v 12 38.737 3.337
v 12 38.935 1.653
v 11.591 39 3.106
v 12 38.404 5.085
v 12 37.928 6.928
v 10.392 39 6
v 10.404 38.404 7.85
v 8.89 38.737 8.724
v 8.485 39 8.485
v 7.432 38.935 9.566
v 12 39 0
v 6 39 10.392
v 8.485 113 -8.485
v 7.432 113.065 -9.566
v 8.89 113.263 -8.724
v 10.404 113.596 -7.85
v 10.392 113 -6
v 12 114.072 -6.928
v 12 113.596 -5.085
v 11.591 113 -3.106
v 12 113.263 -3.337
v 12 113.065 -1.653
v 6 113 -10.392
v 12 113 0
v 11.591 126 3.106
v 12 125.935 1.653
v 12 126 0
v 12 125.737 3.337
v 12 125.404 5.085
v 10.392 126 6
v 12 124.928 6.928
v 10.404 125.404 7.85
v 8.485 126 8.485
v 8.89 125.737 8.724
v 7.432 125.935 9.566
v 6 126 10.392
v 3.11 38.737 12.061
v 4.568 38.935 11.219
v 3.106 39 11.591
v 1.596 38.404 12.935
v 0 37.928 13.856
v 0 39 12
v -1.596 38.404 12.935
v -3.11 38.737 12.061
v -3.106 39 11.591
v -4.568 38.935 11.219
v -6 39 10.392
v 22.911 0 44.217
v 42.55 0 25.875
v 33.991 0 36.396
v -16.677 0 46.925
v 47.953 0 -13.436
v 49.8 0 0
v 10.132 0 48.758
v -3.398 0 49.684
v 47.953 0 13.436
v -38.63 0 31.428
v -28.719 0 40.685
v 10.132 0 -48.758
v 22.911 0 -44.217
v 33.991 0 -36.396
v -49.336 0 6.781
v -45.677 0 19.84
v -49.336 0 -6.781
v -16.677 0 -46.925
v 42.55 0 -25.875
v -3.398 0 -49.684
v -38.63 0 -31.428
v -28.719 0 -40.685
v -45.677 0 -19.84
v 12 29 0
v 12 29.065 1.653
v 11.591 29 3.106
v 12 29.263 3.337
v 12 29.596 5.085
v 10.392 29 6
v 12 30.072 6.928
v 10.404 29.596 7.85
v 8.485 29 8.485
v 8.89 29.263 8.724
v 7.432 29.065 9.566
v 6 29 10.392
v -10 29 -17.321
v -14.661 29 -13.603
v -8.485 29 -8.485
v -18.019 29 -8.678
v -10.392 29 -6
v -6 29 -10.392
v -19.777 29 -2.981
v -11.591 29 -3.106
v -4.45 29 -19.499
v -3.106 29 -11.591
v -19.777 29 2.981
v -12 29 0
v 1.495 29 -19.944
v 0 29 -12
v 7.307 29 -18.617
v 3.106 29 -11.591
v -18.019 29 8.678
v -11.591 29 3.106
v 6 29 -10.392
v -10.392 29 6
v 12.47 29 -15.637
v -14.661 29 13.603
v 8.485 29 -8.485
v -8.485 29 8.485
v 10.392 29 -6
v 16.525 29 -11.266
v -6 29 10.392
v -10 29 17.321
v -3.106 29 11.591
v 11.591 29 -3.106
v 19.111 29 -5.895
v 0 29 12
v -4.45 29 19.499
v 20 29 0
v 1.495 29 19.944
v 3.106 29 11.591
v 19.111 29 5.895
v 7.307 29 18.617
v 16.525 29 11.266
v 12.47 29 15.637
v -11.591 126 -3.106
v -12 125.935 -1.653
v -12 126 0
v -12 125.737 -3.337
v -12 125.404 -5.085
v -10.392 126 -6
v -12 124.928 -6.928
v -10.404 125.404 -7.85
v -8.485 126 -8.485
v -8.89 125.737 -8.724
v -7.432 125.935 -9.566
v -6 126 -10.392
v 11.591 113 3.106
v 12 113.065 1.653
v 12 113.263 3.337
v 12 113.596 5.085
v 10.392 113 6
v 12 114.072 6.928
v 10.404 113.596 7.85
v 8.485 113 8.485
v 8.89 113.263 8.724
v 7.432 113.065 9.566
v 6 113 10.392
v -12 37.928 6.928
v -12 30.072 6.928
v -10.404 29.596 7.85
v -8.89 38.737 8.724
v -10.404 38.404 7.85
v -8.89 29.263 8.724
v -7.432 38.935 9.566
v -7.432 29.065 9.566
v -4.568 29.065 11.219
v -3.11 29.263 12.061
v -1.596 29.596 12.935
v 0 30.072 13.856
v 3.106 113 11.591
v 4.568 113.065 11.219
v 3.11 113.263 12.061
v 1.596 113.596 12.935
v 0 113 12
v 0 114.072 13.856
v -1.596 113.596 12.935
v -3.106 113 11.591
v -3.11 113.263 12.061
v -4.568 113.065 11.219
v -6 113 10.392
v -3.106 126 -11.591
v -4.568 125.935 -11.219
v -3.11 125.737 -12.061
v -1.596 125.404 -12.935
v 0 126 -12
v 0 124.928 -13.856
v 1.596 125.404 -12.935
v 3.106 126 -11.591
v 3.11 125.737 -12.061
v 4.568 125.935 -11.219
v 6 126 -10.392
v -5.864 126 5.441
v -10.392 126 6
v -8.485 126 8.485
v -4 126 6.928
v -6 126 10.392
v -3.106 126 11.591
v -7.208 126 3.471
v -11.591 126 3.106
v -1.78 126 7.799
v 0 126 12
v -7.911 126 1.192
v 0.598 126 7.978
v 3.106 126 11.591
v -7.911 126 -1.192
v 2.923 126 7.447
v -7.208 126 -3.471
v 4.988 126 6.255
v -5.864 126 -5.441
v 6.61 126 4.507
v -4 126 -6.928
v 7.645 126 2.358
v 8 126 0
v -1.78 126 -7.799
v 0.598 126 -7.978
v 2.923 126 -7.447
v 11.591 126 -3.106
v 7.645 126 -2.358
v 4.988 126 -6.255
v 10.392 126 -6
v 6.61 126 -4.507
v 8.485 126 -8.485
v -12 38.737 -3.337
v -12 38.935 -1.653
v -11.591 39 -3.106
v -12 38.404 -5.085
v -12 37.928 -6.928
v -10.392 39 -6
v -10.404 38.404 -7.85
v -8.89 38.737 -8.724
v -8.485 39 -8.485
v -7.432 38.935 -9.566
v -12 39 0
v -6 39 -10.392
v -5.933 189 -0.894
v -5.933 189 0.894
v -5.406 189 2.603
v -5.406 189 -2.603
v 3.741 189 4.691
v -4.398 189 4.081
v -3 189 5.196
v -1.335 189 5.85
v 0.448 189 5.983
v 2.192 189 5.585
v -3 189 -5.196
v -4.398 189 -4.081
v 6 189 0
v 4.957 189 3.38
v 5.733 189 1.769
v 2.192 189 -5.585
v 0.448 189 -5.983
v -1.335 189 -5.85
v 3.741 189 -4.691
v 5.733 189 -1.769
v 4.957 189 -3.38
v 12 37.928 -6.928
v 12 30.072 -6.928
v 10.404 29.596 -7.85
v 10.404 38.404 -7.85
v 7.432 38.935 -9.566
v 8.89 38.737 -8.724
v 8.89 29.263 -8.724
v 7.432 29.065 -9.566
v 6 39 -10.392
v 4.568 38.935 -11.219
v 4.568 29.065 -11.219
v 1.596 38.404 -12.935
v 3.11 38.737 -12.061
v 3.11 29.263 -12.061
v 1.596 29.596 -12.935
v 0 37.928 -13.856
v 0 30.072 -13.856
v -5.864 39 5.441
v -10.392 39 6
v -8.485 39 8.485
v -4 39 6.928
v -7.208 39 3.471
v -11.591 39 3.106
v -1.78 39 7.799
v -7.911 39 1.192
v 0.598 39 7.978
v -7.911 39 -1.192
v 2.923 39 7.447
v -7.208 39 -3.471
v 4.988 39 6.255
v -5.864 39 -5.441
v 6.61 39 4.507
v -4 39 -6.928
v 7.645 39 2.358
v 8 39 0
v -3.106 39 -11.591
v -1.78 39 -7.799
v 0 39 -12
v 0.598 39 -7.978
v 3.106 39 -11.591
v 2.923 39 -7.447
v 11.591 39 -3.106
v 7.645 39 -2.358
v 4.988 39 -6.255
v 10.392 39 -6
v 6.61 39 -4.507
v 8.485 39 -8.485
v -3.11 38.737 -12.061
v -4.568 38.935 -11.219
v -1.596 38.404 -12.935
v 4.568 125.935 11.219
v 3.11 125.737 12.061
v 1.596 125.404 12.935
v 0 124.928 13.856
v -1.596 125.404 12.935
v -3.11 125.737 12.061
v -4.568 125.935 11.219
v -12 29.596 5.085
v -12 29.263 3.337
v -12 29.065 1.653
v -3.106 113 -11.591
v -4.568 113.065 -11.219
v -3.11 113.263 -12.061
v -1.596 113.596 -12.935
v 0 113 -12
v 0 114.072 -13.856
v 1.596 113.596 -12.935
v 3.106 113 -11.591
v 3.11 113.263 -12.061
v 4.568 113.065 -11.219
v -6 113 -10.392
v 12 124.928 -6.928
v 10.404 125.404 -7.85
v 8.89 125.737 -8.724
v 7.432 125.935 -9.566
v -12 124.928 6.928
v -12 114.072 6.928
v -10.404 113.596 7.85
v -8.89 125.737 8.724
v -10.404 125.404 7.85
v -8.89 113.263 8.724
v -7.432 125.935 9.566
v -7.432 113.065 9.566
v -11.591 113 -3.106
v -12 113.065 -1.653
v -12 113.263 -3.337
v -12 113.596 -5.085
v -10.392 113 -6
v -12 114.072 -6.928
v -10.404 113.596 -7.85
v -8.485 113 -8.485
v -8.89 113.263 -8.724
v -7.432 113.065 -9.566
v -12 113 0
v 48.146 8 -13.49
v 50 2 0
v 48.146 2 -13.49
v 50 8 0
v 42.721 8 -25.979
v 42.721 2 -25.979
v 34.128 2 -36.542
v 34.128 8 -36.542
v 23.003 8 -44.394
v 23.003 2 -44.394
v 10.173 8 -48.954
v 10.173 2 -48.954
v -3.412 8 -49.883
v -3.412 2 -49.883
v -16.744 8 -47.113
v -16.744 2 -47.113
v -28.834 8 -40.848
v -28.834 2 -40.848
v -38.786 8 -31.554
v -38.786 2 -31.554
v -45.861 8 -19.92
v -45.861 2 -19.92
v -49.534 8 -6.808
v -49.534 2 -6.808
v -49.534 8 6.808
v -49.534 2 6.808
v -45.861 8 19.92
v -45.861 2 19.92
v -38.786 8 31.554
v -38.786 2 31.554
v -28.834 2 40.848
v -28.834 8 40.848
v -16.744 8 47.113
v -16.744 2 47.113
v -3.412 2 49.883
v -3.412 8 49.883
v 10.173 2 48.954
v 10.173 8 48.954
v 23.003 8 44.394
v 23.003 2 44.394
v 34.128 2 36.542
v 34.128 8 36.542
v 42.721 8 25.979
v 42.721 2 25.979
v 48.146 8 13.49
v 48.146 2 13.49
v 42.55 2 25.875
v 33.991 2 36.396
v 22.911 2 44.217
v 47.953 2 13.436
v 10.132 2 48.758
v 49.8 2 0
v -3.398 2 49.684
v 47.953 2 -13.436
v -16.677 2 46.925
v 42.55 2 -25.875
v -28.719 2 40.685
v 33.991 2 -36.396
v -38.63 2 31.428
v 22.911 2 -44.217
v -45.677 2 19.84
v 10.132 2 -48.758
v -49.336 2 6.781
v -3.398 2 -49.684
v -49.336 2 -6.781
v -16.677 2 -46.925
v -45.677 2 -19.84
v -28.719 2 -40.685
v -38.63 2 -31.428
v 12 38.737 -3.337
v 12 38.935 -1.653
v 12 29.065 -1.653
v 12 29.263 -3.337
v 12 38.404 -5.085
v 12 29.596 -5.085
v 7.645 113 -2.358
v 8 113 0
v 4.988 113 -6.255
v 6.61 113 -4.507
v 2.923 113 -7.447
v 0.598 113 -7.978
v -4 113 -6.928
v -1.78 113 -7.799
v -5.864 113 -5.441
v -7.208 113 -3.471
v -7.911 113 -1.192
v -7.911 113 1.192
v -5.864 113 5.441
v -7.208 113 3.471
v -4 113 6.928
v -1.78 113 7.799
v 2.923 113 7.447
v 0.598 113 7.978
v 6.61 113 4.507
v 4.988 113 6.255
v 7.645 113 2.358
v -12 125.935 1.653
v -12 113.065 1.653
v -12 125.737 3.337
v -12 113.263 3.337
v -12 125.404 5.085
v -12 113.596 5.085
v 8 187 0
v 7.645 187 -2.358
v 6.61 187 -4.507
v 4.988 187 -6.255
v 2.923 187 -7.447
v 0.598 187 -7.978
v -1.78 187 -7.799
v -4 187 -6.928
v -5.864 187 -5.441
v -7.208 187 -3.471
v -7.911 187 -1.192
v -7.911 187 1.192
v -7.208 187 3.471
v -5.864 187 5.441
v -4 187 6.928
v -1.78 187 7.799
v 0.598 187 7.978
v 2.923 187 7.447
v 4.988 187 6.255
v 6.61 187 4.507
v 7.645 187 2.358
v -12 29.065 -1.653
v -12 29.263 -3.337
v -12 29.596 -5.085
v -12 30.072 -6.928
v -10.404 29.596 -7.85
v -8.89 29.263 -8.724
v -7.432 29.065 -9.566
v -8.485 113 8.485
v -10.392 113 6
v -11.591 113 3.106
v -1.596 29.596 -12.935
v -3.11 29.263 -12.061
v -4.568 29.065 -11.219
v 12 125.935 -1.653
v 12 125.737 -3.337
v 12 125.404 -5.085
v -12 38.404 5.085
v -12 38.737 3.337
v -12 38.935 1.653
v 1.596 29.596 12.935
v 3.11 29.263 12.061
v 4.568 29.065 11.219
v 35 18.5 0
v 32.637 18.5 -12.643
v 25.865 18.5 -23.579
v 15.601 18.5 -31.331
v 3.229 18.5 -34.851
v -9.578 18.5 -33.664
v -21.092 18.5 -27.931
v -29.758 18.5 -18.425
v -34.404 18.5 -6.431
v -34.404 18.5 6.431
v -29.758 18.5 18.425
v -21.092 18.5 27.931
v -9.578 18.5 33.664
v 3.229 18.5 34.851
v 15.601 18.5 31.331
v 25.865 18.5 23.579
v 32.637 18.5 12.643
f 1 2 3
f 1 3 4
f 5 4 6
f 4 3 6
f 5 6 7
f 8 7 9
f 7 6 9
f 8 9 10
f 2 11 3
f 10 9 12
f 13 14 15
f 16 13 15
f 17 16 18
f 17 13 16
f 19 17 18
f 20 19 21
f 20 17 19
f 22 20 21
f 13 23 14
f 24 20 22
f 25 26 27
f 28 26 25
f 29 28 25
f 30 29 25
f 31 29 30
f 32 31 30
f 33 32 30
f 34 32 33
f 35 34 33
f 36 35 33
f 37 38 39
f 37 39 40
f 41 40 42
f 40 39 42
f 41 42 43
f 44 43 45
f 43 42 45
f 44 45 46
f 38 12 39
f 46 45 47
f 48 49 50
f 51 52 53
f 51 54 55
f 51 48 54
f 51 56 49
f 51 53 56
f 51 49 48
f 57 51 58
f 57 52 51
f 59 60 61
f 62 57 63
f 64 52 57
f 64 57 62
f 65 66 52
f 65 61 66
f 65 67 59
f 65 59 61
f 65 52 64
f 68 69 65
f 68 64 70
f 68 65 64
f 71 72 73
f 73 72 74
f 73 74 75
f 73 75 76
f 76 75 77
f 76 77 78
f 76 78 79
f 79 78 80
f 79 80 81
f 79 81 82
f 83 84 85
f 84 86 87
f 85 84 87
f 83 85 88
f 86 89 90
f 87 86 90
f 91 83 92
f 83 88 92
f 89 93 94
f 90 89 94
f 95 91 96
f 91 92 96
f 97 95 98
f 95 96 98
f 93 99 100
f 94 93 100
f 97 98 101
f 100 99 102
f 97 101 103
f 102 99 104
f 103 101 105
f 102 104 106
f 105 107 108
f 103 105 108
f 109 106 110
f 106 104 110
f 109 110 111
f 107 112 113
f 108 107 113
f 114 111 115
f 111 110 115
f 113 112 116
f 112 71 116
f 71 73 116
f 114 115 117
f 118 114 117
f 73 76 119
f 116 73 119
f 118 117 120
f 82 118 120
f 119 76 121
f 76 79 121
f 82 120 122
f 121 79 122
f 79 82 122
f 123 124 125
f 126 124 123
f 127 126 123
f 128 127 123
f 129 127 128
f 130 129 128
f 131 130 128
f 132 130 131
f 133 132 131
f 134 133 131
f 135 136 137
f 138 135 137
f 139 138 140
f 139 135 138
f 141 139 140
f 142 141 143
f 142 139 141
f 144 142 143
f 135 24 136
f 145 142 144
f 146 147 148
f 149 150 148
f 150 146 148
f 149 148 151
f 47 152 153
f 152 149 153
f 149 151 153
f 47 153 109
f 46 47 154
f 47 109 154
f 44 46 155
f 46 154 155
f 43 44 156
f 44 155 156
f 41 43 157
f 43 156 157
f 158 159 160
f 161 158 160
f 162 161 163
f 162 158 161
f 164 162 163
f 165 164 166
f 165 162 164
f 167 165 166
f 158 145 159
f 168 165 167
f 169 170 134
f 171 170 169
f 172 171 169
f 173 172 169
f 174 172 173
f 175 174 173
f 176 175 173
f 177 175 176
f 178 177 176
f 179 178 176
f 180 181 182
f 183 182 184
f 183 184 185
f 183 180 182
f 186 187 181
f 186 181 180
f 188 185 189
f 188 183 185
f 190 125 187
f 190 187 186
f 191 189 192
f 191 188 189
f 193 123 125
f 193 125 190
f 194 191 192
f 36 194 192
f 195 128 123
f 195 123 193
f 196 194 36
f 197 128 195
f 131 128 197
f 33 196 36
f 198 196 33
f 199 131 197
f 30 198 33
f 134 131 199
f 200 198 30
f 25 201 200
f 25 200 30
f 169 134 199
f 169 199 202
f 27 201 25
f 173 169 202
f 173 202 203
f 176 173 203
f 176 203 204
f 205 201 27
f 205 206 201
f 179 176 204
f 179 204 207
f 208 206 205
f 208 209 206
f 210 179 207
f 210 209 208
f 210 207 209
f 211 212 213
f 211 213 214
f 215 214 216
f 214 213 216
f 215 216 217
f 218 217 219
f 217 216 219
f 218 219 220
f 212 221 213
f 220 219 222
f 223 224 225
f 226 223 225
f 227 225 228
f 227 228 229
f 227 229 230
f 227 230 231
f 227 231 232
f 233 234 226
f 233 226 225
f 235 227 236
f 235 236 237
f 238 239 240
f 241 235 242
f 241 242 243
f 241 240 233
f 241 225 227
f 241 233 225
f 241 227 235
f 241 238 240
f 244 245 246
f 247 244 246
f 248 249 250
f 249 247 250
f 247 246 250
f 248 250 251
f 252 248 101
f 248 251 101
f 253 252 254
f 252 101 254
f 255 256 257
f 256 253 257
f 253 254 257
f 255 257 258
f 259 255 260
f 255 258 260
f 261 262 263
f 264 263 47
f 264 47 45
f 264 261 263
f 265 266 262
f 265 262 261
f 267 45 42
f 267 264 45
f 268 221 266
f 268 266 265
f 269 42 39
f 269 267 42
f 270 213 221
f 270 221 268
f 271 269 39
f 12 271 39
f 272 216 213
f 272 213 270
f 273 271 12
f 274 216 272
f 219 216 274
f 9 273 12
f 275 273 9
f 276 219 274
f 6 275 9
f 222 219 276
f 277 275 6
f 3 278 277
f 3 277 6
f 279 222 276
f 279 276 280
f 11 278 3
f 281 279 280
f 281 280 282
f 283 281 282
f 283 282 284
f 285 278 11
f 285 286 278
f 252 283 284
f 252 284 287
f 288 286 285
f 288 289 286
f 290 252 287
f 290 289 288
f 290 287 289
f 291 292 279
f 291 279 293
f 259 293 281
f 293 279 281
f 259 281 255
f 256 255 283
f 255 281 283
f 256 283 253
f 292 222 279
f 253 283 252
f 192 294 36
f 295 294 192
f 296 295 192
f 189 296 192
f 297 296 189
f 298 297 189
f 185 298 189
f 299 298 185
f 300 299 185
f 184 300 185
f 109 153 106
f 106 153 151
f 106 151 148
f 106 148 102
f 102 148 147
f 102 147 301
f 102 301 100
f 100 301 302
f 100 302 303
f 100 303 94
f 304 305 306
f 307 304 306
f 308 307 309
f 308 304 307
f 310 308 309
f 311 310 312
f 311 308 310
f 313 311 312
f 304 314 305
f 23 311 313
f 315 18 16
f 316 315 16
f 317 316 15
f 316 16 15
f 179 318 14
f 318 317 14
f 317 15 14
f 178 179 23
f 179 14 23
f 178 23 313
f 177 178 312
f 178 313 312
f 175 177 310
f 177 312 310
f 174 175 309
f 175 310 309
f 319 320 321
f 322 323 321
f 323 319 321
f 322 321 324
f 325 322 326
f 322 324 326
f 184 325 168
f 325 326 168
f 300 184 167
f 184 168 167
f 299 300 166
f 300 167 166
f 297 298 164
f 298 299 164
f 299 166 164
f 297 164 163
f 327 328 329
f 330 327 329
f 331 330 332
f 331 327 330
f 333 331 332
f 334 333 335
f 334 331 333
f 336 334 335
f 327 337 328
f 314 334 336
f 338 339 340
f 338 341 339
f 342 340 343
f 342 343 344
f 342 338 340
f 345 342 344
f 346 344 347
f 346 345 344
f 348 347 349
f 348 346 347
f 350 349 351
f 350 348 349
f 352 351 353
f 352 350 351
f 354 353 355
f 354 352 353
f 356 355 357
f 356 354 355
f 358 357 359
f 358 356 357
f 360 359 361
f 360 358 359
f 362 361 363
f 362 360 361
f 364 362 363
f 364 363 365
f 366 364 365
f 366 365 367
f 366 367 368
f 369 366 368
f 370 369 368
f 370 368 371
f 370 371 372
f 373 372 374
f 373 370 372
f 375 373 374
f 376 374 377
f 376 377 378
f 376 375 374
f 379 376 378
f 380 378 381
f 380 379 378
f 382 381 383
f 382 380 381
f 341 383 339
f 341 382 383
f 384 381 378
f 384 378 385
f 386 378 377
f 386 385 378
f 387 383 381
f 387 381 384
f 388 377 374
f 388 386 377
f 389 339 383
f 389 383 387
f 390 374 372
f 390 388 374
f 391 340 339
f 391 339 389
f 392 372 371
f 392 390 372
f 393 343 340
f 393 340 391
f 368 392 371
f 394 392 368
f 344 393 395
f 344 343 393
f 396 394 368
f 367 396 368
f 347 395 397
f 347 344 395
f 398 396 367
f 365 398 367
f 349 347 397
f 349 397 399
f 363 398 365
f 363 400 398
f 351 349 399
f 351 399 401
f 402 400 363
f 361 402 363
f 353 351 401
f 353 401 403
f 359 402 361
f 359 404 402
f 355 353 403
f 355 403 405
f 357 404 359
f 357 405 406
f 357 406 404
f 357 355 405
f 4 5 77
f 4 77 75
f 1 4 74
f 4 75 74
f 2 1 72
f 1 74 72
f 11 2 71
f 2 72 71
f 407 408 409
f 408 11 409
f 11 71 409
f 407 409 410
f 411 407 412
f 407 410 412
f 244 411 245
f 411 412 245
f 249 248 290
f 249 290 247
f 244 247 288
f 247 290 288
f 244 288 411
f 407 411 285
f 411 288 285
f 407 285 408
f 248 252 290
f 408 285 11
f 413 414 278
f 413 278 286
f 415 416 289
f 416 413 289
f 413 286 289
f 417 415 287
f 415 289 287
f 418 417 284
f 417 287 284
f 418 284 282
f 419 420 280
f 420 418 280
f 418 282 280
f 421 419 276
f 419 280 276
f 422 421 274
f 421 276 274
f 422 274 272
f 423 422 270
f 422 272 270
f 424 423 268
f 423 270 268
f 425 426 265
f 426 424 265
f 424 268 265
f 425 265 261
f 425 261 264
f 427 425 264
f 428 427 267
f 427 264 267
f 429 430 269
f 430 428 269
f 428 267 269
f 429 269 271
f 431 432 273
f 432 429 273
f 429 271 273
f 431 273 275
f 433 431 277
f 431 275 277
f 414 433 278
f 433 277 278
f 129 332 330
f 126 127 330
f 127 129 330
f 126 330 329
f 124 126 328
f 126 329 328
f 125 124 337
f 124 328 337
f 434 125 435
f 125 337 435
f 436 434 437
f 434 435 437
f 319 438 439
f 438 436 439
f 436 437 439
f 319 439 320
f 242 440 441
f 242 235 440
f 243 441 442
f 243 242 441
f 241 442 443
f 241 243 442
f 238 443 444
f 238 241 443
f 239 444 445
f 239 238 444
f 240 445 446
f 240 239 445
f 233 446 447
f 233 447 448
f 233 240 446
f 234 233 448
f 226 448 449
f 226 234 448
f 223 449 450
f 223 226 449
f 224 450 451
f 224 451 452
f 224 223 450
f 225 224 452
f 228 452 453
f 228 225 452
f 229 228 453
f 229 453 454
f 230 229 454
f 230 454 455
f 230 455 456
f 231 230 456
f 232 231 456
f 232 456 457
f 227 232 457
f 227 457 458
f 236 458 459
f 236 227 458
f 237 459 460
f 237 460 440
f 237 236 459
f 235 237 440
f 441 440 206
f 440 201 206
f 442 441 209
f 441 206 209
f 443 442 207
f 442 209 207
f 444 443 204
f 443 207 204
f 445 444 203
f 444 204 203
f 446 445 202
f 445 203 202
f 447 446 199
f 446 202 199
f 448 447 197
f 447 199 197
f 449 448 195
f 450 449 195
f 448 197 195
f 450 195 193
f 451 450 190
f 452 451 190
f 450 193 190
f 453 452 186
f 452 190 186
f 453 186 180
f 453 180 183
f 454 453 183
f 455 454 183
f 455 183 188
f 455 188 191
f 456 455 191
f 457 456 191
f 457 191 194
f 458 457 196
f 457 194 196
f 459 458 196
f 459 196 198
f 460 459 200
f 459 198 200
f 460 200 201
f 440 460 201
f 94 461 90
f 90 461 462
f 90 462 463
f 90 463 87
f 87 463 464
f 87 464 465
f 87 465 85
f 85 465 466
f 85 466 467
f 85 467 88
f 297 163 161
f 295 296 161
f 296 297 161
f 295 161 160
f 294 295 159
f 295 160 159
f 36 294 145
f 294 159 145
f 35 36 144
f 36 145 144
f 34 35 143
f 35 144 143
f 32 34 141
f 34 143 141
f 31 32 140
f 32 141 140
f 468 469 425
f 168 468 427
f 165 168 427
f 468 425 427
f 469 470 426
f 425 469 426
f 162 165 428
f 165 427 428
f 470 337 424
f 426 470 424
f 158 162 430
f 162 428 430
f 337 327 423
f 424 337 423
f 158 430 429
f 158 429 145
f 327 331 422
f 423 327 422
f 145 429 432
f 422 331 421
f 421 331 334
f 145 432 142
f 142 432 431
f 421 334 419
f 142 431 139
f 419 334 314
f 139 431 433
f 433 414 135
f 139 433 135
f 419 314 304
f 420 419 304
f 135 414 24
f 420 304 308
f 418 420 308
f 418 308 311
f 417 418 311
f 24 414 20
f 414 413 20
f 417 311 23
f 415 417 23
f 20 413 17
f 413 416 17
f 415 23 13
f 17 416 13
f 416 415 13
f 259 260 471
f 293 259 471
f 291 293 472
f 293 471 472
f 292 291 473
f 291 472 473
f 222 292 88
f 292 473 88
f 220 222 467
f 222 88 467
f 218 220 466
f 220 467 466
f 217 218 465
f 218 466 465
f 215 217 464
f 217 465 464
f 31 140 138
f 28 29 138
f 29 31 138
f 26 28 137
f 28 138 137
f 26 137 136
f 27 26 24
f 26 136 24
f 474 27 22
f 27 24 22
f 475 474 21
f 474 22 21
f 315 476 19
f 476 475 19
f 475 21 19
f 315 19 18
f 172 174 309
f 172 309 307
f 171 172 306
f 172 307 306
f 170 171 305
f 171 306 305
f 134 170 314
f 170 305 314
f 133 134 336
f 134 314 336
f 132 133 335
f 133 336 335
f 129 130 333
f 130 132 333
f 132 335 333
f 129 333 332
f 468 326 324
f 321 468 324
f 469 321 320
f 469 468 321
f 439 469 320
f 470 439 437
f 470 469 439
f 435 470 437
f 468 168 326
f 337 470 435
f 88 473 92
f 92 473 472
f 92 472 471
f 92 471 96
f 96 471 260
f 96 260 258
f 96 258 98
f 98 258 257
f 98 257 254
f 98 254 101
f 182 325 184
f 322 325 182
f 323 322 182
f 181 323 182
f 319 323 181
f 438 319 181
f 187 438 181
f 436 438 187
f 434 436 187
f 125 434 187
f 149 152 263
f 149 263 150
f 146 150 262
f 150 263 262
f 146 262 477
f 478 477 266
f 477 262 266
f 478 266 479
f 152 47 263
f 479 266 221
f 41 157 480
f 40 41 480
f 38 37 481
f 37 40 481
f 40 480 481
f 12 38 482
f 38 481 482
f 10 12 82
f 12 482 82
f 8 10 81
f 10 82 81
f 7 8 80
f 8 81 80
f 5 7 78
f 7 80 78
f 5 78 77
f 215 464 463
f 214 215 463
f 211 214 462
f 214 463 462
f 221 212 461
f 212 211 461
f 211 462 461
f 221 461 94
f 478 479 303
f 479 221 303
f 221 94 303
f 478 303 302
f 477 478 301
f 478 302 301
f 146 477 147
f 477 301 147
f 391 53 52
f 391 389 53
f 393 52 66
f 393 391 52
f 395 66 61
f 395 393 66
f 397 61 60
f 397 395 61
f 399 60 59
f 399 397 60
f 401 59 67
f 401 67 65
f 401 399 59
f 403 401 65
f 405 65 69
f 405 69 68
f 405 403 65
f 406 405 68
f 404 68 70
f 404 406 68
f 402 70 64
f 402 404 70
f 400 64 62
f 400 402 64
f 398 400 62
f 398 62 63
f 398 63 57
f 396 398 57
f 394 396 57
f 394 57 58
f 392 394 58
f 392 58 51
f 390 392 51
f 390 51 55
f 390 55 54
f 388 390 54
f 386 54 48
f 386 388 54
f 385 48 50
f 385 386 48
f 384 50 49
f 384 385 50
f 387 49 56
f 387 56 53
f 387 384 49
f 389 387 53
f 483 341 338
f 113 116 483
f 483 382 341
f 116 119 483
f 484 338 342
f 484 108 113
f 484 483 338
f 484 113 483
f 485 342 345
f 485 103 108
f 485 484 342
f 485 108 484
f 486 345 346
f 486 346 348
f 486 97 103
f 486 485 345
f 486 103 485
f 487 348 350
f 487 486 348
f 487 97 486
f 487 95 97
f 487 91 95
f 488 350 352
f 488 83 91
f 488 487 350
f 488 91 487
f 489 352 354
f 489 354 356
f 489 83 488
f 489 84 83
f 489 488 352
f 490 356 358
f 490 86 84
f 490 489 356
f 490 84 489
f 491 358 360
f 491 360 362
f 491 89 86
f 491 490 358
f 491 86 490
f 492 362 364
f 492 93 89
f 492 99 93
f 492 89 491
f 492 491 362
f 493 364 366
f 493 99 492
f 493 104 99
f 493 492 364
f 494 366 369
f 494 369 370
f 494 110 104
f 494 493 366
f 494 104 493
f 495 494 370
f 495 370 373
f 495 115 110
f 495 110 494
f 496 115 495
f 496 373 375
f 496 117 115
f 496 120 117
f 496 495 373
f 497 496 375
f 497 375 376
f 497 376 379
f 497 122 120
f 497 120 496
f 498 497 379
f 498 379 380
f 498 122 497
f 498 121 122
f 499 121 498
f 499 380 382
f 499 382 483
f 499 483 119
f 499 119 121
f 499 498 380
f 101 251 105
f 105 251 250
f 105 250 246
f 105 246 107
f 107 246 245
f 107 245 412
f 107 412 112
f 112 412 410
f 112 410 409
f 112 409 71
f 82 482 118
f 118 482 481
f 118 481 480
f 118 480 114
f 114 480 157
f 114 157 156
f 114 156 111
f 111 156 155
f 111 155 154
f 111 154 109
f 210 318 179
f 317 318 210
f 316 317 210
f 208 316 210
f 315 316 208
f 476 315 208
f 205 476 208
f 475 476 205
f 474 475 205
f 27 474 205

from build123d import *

# Parameters (mm, degrees)
EXTRUDE_1_DEPTH = 10
EXTRUDE_2_DEPTH = 13


with BuildPart() as part:
    # Эскиз1 → Повернуть1 (revolve)
    with BuildSketch(Plane.XY, mode=Mode.PRIVATE) as revolve_1_sk:
        Polygon((0, 0), (-49.8, 0), (-49.8, 2), (-50, 2), (-50, 8), (-20, 29), (-8, 29), (-8, 39), (-8, 187), (-6, 189), (0, 189), align=None)
    revolve(revolve_1_sk.sketch.rotate(Axis((0, 0, 0), (0, 1, 0)), 180), axis=Axis((0, 0, 0), (0, 1, 0)))  # turned: the seam where the file's is

    # Эскиз2 → Бобышка-Вытянуть1 (add)
    with BuildSketch(Plane(origin=(0, 29, 0), x_dir=(1, 0, 0), z_dir=(0, 1, 0))):
        Polygon((0, 13.856406461), (-12, 6.92820323), (-12, -6.92820323), (0, -13.856406461), (12, -6.92820323), (12, 6.92820323), align=None)
    extrude(amount=EXTRUDE_1_DEPTH)

    # Эскиз3 → Бобышка-Вытянуть2 (add)
    with BuildSketch(Plane(origin=(0, 113, 0), x_dir=(1, 0, 0), z_dir=(0, 1, 0))):
        Polygon((12, 6.92820323), (0, 13.856406461), (-12, 6.92820323), (-12, -6.92820323), (0, -13.856406461), (12, -6.92820323), align=None)
    extrude(amount=EXTRUDE_2_DEPTH)

    # Эскиз4 → Вырез-Повернуть2 (revolve, cut)
    with BuildSketch(Plane.XY, mode=Mode.PRIVATE) as cut_revolve_2_sk:
        Polygon((-23.258330249, 126), (-12, 126), (-23.258330249, 119.5), align=None)
        Polygon((-23.258330249, 113), (-23.258330249, 119.5), (-12, 113), align=None)
        Polygon((-20.660254038, 39), (-20.660254038, 34), (-12, 39), align=None)
        Polygon((-20.660254038, 34), (-20.660254038, 29), (-12, 29), align=None)
    revolve(cut_revolve_2_sk.sketch.rotate(Axis((0, 189, 0), (0, -1, 0)), 180), axis=Axis((0, 189, 0), (0, -1, 0)), mode=Mode.SUBTRACT)  # turned: the seam where the file's is


solid = part.part
